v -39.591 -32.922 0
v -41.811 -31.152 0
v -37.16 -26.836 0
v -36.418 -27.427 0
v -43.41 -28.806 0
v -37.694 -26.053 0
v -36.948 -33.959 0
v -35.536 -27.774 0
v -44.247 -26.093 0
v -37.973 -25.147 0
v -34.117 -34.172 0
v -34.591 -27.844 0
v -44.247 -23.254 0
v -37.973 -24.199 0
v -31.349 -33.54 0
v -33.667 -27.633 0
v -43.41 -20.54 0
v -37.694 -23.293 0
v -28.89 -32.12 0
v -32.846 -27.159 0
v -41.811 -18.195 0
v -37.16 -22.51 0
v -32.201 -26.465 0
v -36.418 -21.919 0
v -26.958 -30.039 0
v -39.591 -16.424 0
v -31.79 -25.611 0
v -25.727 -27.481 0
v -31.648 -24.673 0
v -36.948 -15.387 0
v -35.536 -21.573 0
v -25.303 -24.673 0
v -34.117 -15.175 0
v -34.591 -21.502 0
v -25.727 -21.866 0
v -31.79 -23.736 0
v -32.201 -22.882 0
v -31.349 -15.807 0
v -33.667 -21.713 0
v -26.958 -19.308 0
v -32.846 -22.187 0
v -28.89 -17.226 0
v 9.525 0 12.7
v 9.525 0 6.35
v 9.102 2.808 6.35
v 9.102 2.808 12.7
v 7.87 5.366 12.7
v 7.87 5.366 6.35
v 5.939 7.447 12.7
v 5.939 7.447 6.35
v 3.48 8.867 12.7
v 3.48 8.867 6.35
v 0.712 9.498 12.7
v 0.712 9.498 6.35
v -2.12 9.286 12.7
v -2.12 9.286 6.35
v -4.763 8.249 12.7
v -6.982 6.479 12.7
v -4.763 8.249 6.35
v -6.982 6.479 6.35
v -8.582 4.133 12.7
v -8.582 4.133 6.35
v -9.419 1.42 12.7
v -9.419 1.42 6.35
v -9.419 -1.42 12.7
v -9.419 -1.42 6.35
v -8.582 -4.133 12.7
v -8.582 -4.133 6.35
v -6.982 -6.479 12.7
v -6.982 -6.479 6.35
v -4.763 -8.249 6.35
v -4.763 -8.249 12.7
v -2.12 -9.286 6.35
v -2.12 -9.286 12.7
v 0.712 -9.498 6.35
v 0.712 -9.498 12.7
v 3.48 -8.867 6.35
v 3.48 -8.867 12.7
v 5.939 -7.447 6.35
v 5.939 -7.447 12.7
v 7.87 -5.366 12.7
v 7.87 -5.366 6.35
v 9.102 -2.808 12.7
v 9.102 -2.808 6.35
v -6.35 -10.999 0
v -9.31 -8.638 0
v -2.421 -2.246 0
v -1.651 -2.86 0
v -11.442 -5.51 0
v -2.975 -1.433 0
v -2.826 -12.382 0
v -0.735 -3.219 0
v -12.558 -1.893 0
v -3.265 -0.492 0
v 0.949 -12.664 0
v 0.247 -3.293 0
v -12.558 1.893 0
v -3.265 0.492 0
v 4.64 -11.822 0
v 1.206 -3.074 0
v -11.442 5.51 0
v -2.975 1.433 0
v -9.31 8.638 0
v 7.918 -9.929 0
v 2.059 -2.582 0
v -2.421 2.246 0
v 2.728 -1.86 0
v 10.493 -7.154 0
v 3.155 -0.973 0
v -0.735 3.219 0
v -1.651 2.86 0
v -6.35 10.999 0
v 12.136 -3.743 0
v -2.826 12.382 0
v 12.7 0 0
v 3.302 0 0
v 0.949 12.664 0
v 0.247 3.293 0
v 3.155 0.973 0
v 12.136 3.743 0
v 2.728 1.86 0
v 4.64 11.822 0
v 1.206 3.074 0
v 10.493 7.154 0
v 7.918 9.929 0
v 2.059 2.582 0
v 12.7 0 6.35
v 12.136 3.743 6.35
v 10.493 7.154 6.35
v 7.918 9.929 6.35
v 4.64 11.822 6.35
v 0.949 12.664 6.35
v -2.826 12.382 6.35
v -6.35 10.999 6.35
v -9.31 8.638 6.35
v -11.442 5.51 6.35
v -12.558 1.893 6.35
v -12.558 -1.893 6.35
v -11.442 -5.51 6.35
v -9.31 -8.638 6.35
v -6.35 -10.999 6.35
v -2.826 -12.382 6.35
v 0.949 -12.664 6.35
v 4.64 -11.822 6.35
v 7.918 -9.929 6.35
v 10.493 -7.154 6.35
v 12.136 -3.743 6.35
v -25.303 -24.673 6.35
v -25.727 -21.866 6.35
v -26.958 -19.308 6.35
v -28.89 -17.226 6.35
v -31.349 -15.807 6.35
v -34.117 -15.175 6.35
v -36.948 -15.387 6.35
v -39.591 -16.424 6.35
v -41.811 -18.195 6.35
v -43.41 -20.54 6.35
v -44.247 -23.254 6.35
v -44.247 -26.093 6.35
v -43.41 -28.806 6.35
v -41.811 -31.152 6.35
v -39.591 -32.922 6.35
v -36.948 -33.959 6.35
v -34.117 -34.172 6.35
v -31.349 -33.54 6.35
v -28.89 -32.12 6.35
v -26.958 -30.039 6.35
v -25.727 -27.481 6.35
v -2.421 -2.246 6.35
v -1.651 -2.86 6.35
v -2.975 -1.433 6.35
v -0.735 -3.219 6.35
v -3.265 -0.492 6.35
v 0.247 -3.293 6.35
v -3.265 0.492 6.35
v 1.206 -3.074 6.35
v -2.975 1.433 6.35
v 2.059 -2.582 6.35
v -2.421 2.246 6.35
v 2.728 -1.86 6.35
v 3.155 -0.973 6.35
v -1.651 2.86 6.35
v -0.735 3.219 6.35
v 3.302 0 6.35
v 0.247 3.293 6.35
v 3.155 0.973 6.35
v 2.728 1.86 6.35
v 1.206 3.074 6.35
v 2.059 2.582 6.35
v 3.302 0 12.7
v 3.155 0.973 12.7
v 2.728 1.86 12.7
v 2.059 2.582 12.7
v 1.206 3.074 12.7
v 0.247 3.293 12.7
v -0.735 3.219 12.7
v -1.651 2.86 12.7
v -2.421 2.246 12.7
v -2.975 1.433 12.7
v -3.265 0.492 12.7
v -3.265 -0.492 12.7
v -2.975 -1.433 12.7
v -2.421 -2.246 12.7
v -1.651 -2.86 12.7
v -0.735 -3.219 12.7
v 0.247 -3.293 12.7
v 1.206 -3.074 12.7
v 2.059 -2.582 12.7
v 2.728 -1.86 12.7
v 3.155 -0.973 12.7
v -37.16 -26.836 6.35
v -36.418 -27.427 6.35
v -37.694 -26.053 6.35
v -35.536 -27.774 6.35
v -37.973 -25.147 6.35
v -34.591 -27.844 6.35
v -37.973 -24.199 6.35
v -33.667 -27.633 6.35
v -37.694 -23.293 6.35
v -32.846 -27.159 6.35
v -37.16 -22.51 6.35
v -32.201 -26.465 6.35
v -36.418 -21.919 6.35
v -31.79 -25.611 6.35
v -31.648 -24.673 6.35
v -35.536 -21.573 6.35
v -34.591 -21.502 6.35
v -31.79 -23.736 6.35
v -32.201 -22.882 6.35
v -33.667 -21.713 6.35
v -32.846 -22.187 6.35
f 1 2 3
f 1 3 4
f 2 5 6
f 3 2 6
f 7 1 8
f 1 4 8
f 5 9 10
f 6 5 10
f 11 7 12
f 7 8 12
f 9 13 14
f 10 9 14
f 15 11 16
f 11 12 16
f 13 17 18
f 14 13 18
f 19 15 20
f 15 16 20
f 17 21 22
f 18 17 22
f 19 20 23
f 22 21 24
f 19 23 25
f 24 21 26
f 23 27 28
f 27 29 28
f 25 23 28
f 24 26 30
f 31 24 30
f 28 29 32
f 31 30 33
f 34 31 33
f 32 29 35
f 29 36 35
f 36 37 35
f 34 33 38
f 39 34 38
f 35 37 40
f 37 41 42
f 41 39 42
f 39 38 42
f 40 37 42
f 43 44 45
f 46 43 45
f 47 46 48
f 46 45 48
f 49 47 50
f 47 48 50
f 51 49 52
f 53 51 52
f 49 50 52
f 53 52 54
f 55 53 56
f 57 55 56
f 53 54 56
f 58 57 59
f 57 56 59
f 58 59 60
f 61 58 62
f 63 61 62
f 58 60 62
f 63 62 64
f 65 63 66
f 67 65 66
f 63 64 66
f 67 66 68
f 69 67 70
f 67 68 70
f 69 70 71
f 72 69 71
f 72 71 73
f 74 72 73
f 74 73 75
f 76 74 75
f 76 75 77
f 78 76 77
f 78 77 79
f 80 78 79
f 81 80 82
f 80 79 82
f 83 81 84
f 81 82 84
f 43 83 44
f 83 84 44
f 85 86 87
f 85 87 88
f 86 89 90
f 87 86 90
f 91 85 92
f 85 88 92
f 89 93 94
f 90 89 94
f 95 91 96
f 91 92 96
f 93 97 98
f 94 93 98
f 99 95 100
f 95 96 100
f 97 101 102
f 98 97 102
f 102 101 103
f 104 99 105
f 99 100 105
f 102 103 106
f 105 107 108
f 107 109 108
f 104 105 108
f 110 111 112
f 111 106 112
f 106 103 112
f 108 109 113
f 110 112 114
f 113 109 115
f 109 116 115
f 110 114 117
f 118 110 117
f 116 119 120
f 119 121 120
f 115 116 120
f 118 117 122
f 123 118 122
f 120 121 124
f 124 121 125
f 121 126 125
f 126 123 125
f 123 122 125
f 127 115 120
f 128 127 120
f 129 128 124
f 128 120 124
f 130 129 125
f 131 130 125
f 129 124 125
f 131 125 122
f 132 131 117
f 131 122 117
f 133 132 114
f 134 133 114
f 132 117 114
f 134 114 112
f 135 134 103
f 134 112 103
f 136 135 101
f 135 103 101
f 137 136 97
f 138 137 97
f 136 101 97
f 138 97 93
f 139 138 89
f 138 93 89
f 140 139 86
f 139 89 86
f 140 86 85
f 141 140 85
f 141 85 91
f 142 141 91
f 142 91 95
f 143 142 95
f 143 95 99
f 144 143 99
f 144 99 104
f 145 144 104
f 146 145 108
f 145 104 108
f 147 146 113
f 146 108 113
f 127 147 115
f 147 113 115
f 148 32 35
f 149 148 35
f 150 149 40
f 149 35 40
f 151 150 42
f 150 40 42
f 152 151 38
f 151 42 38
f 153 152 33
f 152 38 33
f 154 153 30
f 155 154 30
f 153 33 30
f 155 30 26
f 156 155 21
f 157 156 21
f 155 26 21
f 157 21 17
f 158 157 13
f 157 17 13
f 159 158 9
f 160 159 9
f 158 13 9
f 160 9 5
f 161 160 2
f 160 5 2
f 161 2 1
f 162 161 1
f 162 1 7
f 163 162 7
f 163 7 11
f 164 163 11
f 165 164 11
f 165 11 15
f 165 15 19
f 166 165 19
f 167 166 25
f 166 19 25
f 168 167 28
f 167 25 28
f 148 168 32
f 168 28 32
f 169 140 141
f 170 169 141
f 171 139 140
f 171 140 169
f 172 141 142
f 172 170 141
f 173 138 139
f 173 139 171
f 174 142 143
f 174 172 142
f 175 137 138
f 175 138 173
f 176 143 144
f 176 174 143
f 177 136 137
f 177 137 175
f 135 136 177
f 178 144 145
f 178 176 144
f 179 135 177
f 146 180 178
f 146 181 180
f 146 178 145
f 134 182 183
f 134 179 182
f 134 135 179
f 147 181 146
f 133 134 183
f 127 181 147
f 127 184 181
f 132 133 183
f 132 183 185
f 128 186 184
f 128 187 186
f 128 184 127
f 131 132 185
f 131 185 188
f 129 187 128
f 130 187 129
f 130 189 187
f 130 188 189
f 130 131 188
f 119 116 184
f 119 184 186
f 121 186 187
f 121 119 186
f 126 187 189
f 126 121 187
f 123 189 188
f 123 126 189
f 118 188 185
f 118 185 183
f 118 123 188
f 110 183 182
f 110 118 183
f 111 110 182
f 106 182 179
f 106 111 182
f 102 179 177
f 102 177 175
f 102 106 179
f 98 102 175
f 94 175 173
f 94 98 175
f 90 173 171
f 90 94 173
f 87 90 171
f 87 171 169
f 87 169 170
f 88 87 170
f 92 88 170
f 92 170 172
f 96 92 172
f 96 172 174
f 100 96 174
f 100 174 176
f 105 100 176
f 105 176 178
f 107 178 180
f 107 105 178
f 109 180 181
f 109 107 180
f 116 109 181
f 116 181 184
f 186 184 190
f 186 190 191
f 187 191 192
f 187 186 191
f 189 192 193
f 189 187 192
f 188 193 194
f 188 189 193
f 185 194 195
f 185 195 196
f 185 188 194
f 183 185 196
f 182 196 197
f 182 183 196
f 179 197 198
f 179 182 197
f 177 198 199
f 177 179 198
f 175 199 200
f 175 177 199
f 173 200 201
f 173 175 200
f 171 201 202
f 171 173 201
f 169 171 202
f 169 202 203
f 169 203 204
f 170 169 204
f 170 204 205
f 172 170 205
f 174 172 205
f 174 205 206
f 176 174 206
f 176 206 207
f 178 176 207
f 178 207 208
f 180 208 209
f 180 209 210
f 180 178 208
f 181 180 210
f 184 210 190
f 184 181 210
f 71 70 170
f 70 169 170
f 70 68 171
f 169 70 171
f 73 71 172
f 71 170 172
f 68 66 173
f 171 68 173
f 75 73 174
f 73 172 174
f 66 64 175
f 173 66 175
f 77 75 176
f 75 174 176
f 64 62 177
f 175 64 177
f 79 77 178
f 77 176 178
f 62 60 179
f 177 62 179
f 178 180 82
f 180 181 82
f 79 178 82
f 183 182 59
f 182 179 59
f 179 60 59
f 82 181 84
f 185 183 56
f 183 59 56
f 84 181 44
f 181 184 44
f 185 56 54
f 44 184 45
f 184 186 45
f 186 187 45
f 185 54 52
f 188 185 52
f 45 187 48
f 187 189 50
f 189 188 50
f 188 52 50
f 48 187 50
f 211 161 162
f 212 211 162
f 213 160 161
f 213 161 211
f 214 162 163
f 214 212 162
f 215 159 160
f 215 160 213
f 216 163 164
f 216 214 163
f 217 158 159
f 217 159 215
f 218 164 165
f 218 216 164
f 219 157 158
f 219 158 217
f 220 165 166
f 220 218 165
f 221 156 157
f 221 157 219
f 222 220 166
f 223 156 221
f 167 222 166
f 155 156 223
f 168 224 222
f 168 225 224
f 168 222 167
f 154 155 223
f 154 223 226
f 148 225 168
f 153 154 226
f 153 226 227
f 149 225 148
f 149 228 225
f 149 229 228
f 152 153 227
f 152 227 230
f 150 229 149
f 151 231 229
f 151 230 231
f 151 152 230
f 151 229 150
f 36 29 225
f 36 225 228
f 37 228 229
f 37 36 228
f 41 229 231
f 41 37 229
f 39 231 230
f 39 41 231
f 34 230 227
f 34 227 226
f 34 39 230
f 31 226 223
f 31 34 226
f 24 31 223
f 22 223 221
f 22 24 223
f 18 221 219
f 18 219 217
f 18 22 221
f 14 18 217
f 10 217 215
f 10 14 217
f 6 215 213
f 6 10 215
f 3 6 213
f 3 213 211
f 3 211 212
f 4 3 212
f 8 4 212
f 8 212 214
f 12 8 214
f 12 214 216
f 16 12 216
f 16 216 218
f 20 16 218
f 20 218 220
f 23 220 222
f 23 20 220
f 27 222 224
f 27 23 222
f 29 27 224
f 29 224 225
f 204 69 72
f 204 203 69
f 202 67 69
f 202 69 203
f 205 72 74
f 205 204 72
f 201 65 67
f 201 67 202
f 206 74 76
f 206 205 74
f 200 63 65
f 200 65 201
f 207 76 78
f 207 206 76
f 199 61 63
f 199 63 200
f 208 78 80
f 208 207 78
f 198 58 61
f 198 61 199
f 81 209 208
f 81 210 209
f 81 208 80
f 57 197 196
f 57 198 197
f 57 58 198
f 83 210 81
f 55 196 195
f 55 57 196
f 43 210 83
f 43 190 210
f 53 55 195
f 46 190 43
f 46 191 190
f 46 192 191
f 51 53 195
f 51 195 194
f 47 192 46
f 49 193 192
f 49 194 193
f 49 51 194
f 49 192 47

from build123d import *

# Parameters (mm, degrees)
F0_R     = 12.7
F0_R_2   = 3.302
F1_DEPTH = 6.35
F3_R     = 9.525
F3_R_2   = 3.18008
F4_DEPTH = 6.35
F2_R     = 9.525
F2_R_2   = 3.302
F5_DEPTH = 6.35


with BuildPart() as f1:
    # F0 (on Top) → F1 (new body)
    with BuildSketch(Plane.XY):
        Circle(F0_R)
        Circle(F0_R_2, mode=Mode.SUBTRACT)
    extrude(amount=F1_DEPTH)


with BuildPart() as f4:
    # F3 (on Top) → F4 (new body)
    with BuildSketch(Plane.XY):
        with Locations((-34.828402, -24.673155)):
            Circle(F3_R)
        with Locations((-34.828402, -24.673155)):
            Circle(F3_R_2, mode=Mode.SUBTRACT)
    extrude(amount=F4_DEPTH)


with BuildPart() as f5:
    # F2 (on face) → F5 (new body)
    with BuildSketch(Plane.XY.offset(6.35)):
        Circle(F2_R)
        Circle(F2_R_2, mode=Mode.SUBTRACT)
    extrude(amount=F5_DEPTH)


solid = Compound([f1.part, f4.part, f5.part])
